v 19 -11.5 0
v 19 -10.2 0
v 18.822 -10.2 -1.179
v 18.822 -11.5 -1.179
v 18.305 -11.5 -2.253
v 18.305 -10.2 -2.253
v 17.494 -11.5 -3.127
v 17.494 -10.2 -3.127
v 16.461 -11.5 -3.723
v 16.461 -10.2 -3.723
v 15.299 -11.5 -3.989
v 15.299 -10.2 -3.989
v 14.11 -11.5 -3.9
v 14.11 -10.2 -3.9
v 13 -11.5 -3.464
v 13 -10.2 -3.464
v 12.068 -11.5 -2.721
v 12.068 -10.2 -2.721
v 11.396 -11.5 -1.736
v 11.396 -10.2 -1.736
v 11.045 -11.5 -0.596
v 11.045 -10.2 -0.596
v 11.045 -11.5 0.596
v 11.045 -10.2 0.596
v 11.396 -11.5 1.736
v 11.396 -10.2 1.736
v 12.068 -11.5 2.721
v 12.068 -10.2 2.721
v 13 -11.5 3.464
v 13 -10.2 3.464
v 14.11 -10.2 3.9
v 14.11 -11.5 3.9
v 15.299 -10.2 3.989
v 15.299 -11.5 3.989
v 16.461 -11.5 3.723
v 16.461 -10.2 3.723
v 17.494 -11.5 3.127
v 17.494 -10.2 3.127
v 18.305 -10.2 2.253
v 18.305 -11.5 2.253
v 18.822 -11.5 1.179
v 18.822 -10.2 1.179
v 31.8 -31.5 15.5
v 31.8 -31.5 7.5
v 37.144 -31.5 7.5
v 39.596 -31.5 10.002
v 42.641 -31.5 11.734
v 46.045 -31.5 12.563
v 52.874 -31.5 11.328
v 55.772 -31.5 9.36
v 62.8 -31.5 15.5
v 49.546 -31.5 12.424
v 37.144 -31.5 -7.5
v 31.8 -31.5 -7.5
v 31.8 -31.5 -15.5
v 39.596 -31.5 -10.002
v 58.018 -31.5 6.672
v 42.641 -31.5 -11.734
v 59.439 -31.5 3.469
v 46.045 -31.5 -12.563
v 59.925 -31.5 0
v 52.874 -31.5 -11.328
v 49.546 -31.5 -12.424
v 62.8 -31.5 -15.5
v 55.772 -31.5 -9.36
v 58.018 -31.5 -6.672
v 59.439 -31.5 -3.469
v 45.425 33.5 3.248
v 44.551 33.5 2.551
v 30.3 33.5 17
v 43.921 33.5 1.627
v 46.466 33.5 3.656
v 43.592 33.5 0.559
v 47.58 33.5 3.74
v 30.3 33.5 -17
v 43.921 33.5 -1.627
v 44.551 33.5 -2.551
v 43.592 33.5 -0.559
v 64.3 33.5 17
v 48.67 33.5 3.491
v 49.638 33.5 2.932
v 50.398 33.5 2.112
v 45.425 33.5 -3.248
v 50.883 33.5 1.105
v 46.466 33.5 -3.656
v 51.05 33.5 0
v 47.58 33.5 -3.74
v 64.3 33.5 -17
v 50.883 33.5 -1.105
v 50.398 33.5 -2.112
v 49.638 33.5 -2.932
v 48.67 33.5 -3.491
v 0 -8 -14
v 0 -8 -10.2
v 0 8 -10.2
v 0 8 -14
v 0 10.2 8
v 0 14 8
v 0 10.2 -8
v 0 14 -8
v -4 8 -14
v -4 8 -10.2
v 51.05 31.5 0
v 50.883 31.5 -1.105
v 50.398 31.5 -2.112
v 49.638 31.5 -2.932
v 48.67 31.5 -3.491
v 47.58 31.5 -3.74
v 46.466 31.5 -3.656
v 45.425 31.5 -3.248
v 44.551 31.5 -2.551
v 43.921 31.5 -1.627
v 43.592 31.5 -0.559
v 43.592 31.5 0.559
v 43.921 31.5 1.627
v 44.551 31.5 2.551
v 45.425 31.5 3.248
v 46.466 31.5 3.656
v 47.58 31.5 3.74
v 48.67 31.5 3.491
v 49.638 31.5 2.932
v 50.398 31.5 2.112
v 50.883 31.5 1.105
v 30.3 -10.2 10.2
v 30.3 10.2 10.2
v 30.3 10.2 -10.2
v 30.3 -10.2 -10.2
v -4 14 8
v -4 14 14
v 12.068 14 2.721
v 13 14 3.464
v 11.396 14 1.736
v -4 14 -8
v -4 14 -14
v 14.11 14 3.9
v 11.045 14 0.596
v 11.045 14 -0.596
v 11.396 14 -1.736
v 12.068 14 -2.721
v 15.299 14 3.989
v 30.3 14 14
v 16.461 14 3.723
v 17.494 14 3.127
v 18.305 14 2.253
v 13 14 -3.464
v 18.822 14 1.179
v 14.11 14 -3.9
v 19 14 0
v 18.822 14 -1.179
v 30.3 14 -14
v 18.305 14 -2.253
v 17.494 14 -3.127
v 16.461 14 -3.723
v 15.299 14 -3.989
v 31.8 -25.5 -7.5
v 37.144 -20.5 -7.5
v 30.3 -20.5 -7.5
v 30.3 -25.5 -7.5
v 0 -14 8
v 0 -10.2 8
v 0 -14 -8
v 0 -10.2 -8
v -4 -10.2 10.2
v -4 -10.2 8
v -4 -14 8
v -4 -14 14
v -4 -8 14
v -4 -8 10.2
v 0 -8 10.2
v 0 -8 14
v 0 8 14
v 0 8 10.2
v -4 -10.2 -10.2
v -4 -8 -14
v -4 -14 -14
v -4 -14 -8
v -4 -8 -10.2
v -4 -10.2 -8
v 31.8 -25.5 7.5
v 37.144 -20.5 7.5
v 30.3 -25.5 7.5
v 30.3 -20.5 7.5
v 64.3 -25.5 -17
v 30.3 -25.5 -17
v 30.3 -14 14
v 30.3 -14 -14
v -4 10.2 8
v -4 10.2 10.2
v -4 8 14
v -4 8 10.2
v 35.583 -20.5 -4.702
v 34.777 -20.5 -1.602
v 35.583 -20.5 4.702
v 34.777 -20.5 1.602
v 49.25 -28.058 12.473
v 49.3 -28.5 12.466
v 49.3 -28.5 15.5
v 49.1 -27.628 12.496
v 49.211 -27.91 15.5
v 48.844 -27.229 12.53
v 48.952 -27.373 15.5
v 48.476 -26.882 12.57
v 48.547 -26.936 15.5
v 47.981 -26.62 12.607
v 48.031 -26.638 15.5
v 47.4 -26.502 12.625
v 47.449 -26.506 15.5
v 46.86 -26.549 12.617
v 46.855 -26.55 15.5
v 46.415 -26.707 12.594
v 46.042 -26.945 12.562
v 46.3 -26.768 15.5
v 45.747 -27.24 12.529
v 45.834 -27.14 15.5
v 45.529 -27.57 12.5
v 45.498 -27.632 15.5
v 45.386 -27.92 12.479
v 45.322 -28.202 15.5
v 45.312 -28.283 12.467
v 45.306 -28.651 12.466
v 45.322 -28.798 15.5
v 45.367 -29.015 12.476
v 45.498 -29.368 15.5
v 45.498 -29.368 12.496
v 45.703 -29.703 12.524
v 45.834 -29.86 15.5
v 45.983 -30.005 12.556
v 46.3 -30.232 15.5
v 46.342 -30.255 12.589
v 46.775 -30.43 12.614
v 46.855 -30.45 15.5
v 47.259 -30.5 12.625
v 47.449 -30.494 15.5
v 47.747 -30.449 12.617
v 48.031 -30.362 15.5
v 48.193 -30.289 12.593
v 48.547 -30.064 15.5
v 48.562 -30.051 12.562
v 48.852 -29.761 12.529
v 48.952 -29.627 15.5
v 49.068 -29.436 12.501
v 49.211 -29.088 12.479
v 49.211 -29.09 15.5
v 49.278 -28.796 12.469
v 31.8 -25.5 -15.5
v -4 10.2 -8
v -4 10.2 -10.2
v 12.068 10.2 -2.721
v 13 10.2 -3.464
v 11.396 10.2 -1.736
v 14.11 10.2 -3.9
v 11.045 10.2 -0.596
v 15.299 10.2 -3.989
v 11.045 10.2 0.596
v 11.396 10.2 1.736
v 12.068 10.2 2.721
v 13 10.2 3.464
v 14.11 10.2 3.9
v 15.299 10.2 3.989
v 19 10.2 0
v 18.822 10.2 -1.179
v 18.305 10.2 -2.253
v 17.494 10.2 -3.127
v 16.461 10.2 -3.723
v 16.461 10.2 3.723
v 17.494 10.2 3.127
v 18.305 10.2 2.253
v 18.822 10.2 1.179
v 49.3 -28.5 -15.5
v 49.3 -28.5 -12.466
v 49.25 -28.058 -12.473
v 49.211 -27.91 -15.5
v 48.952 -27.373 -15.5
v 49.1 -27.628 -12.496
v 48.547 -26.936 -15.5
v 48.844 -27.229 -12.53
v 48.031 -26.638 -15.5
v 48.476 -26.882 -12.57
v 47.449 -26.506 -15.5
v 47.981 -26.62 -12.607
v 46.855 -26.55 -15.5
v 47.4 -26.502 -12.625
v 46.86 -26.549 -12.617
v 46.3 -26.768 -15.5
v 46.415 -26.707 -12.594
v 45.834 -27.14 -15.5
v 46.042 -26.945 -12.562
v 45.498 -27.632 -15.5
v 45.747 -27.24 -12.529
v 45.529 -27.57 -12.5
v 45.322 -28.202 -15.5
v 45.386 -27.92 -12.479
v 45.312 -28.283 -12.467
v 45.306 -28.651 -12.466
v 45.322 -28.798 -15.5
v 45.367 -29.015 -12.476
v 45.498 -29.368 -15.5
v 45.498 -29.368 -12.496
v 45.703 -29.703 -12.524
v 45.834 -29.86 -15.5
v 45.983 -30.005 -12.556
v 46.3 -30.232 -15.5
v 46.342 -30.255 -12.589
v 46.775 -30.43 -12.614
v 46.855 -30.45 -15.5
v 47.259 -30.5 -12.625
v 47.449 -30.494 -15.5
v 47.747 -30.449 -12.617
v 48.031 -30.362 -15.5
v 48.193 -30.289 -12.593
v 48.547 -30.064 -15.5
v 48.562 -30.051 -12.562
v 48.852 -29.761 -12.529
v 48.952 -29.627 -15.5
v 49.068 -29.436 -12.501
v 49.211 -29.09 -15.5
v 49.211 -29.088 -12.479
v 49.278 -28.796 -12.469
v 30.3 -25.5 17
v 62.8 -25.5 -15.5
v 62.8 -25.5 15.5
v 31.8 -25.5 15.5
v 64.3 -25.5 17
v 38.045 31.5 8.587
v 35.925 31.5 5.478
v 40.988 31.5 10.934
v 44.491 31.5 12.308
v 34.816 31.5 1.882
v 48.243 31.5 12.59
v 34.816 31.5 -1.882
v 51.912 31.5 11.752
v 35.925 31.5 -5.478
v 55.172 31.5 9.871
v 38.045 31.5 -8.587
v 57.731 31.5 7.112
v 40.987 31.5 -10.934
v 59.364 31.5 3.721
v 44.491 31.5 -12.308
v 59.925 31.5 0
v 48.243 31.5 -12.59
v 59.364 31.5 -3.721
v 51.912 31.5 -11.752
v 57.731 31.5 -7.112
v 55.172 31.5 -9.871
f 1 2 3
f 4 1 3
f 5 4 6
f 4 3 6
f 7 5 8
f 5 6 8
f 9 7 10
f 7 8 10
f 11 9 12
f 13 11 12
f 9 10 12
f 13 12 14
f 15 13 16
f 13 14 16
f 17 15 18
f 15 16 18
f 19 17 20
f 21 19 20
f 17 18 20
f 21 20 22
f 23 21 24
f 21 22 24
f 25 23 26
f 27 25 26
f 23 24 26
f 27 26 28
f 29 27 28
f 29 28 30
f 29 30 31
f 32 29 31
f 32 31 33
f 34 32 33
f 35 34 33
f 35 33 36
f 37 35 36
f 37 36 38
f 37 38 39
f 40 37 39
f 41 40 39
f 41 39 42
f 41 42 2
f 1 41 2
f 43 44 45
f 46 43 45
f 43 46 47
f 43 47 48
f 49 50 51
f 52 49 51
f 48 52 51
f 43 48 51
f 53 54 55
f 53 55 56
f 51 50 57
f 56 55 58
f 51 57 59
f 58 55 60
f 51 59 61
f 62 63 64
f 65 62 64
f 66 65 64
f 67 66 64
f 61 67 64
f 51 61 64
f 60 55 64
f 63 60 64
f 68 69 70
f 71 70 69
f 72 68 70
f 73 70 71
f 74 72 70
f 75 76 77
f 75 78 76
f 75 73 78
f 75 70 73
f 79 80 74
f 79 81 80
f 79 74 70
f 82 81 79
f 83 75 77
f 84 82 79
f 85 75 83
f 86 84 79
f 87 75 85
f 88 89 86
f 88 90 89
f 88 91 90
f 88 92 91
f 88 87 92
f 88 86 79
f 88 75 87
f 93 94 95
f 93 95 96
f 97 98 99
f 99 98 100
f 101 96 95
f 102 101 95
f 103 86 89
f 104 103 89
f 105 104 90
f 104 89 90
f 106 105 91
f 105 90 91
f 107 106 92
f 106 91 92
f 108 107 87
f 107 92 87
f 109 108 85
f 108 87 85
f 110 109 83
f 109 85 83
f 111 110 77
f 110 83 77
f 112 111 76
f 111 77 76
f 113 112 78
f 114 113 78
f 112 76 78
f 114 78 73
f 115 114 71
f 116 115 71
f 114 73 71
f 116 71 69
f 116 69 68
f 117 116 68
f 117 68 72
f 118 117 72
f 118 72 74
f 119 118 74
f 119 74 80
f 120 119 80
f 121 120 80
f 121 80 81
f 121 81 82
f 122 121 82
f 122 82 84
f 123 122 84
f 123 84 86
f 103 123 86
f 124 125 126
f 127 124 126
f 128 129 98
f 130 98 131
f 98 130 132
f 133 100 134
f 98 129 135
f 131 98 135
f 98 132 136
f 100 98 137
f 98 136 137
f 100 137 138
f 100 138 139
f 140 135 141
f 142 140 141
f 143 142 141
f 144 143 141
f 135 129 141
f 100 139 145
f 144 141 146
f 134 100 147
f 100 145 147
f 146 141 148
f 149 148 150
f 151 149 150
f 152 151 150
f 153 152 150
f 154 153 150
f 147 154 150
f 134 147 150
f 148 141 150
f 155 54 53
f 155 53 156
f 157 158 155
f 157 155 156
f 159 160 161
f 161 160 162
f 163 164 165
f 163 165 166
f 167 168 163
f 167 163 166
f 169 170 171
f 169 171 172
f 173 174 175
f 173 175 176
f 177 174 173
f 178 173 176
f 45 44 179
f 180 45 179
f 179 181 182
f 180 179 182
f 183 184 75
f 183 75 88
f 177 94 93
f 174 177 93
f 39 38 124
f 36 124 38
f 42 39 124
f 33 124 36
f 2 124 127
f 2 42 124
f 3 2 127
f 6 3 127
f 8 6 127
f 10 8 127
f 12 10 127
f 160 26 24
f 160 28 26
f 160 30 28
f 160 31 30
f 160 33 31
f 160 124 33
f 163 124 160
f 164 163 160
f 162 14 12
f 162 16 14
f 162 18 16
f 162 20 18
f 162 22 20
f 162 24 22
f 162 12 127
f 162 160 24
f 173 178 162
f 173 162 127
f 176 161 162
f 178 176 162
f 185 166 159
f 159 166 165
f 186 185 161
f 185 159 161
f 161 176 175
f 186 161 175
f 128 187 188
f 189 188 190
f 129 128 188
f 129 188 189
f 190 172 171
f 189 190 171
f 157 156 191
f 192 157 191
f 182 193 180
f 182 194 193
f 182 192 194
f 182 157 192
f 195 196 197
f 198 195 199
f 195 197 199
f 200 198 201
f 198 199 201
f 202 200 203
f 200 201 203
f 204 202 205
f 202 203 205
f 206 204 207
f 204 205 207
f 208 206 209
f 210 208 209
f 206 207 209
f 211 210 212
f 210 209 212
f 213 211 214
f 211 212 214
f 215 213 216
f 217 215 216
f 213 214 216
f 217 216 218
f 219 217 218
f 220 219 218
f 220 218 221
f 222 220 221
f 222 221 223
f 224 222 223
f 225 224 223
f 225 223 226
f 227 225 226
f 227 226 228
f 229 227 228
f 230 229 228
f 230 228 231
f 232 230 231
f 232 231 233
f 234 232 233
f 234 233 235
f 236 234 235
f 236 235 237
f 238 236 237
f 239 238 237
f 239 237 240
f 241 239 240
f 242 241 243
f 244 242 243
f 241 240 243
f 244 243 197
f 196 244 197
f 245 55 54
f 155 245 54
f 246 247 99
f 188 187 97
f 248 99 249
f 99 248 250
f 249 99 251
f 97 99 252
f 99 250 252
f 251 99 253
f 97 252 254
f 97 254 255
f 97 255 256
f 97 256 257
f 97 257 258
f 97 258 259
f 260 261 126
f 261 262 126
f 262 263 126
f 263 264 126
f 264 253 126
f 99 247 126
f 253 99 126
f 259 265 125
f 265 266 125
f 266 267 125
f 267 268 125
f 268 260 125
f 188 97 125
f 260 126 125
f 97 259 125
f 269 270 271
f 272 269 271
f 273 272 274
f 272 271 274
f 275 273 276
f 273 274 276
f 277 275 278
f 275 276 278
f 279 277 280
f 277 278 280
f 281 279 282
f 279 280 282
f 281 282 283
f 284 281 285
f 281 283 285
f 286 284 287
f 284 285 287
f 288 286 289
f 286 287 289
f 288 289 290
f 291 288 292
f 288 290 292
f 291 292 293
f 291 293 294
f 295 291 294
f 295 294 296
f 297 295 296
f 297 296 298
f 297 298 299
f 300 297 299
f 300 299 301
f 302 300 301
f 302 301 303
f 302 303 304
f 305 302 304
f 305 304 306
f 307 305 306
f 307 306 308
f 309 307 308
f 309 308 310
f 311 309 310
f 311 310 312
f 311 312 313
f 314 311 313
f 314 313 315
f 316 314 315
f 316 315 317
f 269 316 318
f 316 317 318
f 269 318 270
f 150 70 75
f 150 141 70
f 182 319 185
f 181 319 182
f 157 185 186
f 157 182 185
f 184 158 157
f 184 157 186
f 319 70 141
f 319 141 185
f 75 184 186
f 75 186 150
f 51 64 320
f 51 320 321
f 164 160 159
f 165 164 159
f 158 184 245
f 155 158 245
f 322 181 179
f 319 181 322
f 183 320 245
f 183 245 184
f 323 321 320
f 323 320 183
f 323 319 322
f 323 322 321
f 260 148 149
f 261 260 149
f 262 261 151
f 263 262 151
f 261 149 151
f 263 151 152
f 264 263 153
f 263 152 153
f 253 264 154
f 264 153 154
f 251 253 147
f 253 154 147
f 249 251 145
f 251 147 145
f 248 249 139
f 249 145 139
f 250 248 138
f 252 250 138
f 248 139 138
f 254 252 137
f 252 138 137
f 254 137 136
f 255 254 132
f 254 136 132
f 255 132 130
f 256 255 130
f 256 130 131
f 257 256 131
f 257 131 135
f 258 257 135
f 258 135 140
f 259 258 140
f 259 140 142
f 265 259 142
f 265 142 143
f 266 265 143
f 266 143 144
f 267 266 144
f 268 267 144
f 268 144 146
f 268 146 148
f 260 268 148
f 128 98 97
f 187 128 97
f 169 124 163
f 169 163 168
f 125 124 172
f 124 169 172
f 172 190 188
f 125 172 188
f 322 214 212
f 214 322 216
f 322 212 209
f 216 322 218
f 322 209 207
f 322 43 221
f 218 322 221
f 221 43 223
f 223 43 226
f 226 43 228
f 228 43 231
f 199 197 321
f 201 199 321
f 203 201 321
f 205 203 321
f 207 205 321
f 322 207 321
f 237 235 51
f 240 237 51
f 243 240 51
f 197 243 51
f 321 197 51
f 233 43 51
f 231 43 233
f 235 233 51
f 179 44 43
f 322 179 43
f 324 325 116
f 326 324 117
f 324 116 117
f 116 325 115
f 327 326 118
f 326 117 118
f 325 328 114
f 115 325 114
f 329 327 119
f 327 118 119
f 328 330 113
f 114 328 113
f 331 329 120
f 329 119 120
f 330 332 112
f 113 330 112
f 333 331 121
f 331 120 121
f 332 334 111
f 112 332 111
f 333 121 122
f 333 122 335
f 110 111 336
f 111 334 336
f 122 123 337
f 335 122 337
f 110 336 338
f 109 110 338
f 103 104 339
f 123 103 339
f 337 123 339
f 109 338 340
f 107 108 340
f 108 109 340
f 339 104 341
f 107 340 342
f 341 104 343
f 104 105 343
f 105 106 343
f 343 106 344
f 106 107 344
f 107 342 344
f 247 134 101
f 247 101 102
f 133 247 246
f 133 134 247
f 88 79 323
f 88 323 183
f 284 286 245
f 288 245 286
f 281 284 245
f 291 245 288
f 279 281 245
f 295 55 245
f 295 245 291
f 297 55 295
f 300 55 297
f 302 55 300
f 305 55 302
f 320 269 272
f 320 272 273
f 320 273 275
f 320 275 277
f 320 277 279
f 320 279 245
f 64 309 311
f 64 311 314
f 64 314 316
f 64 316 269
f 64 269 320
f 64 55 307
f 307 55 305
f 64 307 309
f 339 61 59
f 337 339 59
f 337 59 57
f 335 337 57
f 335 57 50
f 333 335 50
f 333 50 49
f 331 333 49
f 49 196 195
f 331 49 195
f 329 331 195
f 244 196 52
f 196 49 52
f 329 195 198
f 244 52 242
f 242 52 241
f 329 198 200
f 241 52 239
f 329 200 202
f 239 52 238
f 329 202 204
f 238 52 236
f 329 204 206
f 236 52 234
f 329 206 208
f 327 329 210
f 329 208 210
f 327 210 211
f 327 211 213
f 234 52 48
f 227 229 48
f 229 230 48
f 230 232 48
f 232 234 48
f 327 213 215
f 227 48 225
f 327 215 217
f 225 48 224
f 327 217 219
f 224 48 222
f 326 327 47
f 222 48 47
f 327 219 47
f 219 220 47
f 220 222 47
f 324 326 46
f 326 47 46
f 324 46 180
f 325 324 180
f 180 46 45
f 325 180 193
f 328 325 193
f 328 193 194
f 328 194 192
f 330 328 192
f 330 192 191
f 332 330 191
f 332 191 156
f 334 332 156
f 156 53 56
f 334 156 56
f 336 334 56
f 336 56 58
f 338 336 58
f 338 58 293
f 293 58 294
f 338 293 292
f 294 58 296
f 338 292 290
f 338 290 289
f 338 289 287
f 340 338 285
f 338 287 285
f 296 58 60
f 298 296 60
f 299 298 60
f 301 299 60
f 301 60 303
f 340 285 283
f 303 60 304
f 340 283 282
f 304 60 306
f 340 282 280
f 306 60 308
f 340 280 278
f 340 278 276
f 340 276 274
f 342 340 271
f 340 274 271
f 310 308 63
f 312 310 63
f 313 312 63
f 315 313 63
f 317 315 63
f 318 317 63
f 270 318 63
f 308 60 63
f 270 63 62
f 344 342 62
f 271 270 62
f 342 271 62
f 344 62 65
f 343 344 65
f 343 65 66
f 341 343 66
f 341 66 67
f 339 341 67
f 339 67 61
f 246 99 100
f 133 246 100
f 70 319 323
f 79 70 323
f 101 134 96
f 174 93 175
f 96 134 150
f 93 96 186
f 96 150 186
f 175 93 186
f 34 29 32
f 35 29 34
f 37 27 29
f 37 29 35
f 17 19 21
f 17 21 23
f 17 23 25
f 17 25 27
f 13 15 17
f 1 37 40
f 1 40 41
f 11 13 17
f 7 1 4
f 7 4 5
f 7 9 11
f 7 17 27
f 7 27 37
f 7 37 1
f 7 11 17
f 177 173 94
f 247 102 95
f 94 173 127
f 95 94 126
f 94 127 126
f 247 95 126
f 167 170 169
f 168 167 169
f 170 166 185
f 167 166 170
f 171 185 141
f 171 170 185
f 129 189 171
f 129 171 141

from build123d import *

# Parameters (mm, degrees)
CROQUIS1_W              = 28
CROQUIS1_H              = 28
CROQUIS1_W_2            = 20.4
CROQUIS1_H_2            = 20.4
SALIENTE_EXTRUIR1_DEPTH = 30.3
CROQUIS2_W              = 34
CROQUIS2_H              = 34
SALIENTE_EXTRUIR2_DEPTH = 31.5
CROQUIS3_R              = 12.625
CORTAR_EXTRUIR1_DEPTH   = 63
CROQUIS4_W              = 34
CROQUIS4_H              = 34
SALIENTE_EXTRUIR3_DEPTH = 2
CORTAR_EXTRUIR2_REACH   = 67
CROQUIS5_R              = 3.75
CORTAR_EXTRUIR3_REACH   = 36
CROQUIS6_W              = 15
CROQUIS6_H              = 11
CROQUIS7_W              = 34
CROQUIS7_H              = 34
CROQUIS7_W_2            = 31
CROQUIS7_H_2            = 31
CORTAR_EXTRUIR4_DEPTH   = 6
CROQUIS8_R              = 2
CORTAR_EXTRUIR7_DEPTH   = 40
CROQUIS10_R             = 4
CORTAR_EXTRUIR8_DEPTH   = 25.5
SALIENTE_EXTRUIR4_DEPTH = 4


with BuildPart() as part:
    # Croquis1 → Saliente-Extruir1 (new body)
    with BuildSketch(Plane(origin=(0, 0, 0), x_dir=(0, 0, -1), z_dir=(1, 0, 0))):
        Rectangle(CROQUIS1_W, CROQUIS1_H)
        Rectangle(CROQUIS1_W_2, CROQUIS1_H_2, mode=Mode.SUBTRACT)
    extrude(amount=SALIENTE_EXTRUIR1_DEPTH)

    # Croquis2 → Saliente-Extruir2 (add, symmetric)
    with BuildSketch(Plane(origin=(0, 0, 0), x_dir=(1, 0, 0), z_dir=(0, 1, 0))):
        with Locations((47.3, 0)):
            Rectangle(CROQUIS2_W, CROQUIS2_H)
    extrude(amount=SALIENTE_EXTRUIR2_DEPTH, both=True)

    # Croquis3 → Cortar-Extruir1 (cut)
    with BuildSketch(Plane.XZ.offset(31.5)):
        with Locations((47.3, 0)):
            Circle(CROQUIS3_R)
    extrude(amount=-CORTAR_EXTRUIR1_DEPTH, mode=Mode.SUBTRACT)

    # Croquis4 → Saliente-Extruir3 (add)
    with BuildSketch(Plane(origin=(0, 31.5, 0), x_dir=(1, 0, 0), z_dir=(0, 1, 0))):
        with Locations((47.3, 0)):
            Rectangle(CROQUIS4_W, CROQUIS4_H)
    extrude(amount=SALIENTE_EXTRUIR3_DEPTH)

    # Croquis5 → Cortar-Extruir2 (cut, up to next)
    with BuildSketch(Plane(origin=(0, 33.5, 0), x_dir=(1, 0, 0), z_dir=(0, 1, 0)), mode=Mode.PRIVATE) as cortar_extruir2_sk1:
        with Locations((47.3, 0)):
            Circle(CROQUIS5_R)
    cortar_extruir2_tool1 = extrude(cortar_extruir2_sk1.sketch, amount=-CORTAR_EXTRUIR2_REACH, mode=Mode.PRIVATE) & part.part
    add(cortar_extruir2_tool1.solids().sort_by_distance((47.3, 33.5, 0))[0], mode=Mode.SUBTRACT)

    # Croquis6 → Cortar-Extruir3 (cut, up to next)
    with BuildSketch(Plane.ZY.offset(-30.3), mode=Mode.PRIVATE) as cortar_extruir3_sk1:
        with Locations((0, -26)):
            Rectangle(CROQUIS6_W, CROQUIS6_H)
    cortar_extruir3_tool1 = extrude(cortar_extruir3_sk1.sketch, amount=-CORTAR_EXTRUIR3_REACH, mode=Mode.PRIVATE) & part.part
    add(cortar_extruir3_tool1.solids().sort_by_distance((30.3, -26, 0))[0], mode=Mode.SUBTRACT)

    # Croquis7 → Cortar-Extruir4 (cut)
    with BuildSketch(Plane.XZ.offset(31.5)):
        with Locations((47.3, 0)):
            Rectangle(CROQUIS7_W, CROQUIS7_H)
        with Locations((47.3, 0)):
            Rectangle(CROQUIS7_W_2, CROQUIS7_H_2, mode=Mode.SUBTRACT)
    extrude(amount=-CORTAR_EXTRUIR4_DEPTH, mode=Mode.SUBTRACT)

    # Croquis8 → Cortar-Extruir7 (cut)
    with BuildSketch(Plane.XY.offset(15.5)):
        with Locations((47.3, -28.5)):
            Circle(CROQUIS8_R)
    extrude(amount=-CORTAR_EXTRUIR7_DEPTH, mode=Mode.SUBTRACT)

    # Croquis10 → Cortar-Extruir8 (cut)
    with BuildSketch(Plane(origin=(0, 14, 0), x_dir=(1, 0, 0), z_dir=(0, 1, 0))):
        with Locations((15, 0)):
            Circle(CROQUIS10_R)
    extrude(amount=-CORTAR_EXTRUIR8_DEPTH, mode=Mode.SUBTRACT)

    # Croquis12 → Saliente-Extruir4 (add)
    with BuildSketch(Plane.ZY):
        Polygon((-8, 10.2), (-8, 14), (-14, 14), (-14, 8), (-10.2, 8), (-10.2, 10.2), align=None)
        Polygon((14, 10.2), (14, 14), (8, 14), (8, 10.2), (10.2, 10.2), (10.2, 8), (14, 8), align=None)
        Polygon((14, -14), (14, -8), (10.2, -8), (10.2, -10.2), (8, -10.2), (8, -14), align=None)
        Polygon((-10.2, -8), (-14, -8), (-14, -14), (-8, -14), (-8, -10.2), (-10.2, -10.2), align=None)
    extrude(amount=SALIENTE_EXTRUIR4_DEPTH)


solid = part.part
